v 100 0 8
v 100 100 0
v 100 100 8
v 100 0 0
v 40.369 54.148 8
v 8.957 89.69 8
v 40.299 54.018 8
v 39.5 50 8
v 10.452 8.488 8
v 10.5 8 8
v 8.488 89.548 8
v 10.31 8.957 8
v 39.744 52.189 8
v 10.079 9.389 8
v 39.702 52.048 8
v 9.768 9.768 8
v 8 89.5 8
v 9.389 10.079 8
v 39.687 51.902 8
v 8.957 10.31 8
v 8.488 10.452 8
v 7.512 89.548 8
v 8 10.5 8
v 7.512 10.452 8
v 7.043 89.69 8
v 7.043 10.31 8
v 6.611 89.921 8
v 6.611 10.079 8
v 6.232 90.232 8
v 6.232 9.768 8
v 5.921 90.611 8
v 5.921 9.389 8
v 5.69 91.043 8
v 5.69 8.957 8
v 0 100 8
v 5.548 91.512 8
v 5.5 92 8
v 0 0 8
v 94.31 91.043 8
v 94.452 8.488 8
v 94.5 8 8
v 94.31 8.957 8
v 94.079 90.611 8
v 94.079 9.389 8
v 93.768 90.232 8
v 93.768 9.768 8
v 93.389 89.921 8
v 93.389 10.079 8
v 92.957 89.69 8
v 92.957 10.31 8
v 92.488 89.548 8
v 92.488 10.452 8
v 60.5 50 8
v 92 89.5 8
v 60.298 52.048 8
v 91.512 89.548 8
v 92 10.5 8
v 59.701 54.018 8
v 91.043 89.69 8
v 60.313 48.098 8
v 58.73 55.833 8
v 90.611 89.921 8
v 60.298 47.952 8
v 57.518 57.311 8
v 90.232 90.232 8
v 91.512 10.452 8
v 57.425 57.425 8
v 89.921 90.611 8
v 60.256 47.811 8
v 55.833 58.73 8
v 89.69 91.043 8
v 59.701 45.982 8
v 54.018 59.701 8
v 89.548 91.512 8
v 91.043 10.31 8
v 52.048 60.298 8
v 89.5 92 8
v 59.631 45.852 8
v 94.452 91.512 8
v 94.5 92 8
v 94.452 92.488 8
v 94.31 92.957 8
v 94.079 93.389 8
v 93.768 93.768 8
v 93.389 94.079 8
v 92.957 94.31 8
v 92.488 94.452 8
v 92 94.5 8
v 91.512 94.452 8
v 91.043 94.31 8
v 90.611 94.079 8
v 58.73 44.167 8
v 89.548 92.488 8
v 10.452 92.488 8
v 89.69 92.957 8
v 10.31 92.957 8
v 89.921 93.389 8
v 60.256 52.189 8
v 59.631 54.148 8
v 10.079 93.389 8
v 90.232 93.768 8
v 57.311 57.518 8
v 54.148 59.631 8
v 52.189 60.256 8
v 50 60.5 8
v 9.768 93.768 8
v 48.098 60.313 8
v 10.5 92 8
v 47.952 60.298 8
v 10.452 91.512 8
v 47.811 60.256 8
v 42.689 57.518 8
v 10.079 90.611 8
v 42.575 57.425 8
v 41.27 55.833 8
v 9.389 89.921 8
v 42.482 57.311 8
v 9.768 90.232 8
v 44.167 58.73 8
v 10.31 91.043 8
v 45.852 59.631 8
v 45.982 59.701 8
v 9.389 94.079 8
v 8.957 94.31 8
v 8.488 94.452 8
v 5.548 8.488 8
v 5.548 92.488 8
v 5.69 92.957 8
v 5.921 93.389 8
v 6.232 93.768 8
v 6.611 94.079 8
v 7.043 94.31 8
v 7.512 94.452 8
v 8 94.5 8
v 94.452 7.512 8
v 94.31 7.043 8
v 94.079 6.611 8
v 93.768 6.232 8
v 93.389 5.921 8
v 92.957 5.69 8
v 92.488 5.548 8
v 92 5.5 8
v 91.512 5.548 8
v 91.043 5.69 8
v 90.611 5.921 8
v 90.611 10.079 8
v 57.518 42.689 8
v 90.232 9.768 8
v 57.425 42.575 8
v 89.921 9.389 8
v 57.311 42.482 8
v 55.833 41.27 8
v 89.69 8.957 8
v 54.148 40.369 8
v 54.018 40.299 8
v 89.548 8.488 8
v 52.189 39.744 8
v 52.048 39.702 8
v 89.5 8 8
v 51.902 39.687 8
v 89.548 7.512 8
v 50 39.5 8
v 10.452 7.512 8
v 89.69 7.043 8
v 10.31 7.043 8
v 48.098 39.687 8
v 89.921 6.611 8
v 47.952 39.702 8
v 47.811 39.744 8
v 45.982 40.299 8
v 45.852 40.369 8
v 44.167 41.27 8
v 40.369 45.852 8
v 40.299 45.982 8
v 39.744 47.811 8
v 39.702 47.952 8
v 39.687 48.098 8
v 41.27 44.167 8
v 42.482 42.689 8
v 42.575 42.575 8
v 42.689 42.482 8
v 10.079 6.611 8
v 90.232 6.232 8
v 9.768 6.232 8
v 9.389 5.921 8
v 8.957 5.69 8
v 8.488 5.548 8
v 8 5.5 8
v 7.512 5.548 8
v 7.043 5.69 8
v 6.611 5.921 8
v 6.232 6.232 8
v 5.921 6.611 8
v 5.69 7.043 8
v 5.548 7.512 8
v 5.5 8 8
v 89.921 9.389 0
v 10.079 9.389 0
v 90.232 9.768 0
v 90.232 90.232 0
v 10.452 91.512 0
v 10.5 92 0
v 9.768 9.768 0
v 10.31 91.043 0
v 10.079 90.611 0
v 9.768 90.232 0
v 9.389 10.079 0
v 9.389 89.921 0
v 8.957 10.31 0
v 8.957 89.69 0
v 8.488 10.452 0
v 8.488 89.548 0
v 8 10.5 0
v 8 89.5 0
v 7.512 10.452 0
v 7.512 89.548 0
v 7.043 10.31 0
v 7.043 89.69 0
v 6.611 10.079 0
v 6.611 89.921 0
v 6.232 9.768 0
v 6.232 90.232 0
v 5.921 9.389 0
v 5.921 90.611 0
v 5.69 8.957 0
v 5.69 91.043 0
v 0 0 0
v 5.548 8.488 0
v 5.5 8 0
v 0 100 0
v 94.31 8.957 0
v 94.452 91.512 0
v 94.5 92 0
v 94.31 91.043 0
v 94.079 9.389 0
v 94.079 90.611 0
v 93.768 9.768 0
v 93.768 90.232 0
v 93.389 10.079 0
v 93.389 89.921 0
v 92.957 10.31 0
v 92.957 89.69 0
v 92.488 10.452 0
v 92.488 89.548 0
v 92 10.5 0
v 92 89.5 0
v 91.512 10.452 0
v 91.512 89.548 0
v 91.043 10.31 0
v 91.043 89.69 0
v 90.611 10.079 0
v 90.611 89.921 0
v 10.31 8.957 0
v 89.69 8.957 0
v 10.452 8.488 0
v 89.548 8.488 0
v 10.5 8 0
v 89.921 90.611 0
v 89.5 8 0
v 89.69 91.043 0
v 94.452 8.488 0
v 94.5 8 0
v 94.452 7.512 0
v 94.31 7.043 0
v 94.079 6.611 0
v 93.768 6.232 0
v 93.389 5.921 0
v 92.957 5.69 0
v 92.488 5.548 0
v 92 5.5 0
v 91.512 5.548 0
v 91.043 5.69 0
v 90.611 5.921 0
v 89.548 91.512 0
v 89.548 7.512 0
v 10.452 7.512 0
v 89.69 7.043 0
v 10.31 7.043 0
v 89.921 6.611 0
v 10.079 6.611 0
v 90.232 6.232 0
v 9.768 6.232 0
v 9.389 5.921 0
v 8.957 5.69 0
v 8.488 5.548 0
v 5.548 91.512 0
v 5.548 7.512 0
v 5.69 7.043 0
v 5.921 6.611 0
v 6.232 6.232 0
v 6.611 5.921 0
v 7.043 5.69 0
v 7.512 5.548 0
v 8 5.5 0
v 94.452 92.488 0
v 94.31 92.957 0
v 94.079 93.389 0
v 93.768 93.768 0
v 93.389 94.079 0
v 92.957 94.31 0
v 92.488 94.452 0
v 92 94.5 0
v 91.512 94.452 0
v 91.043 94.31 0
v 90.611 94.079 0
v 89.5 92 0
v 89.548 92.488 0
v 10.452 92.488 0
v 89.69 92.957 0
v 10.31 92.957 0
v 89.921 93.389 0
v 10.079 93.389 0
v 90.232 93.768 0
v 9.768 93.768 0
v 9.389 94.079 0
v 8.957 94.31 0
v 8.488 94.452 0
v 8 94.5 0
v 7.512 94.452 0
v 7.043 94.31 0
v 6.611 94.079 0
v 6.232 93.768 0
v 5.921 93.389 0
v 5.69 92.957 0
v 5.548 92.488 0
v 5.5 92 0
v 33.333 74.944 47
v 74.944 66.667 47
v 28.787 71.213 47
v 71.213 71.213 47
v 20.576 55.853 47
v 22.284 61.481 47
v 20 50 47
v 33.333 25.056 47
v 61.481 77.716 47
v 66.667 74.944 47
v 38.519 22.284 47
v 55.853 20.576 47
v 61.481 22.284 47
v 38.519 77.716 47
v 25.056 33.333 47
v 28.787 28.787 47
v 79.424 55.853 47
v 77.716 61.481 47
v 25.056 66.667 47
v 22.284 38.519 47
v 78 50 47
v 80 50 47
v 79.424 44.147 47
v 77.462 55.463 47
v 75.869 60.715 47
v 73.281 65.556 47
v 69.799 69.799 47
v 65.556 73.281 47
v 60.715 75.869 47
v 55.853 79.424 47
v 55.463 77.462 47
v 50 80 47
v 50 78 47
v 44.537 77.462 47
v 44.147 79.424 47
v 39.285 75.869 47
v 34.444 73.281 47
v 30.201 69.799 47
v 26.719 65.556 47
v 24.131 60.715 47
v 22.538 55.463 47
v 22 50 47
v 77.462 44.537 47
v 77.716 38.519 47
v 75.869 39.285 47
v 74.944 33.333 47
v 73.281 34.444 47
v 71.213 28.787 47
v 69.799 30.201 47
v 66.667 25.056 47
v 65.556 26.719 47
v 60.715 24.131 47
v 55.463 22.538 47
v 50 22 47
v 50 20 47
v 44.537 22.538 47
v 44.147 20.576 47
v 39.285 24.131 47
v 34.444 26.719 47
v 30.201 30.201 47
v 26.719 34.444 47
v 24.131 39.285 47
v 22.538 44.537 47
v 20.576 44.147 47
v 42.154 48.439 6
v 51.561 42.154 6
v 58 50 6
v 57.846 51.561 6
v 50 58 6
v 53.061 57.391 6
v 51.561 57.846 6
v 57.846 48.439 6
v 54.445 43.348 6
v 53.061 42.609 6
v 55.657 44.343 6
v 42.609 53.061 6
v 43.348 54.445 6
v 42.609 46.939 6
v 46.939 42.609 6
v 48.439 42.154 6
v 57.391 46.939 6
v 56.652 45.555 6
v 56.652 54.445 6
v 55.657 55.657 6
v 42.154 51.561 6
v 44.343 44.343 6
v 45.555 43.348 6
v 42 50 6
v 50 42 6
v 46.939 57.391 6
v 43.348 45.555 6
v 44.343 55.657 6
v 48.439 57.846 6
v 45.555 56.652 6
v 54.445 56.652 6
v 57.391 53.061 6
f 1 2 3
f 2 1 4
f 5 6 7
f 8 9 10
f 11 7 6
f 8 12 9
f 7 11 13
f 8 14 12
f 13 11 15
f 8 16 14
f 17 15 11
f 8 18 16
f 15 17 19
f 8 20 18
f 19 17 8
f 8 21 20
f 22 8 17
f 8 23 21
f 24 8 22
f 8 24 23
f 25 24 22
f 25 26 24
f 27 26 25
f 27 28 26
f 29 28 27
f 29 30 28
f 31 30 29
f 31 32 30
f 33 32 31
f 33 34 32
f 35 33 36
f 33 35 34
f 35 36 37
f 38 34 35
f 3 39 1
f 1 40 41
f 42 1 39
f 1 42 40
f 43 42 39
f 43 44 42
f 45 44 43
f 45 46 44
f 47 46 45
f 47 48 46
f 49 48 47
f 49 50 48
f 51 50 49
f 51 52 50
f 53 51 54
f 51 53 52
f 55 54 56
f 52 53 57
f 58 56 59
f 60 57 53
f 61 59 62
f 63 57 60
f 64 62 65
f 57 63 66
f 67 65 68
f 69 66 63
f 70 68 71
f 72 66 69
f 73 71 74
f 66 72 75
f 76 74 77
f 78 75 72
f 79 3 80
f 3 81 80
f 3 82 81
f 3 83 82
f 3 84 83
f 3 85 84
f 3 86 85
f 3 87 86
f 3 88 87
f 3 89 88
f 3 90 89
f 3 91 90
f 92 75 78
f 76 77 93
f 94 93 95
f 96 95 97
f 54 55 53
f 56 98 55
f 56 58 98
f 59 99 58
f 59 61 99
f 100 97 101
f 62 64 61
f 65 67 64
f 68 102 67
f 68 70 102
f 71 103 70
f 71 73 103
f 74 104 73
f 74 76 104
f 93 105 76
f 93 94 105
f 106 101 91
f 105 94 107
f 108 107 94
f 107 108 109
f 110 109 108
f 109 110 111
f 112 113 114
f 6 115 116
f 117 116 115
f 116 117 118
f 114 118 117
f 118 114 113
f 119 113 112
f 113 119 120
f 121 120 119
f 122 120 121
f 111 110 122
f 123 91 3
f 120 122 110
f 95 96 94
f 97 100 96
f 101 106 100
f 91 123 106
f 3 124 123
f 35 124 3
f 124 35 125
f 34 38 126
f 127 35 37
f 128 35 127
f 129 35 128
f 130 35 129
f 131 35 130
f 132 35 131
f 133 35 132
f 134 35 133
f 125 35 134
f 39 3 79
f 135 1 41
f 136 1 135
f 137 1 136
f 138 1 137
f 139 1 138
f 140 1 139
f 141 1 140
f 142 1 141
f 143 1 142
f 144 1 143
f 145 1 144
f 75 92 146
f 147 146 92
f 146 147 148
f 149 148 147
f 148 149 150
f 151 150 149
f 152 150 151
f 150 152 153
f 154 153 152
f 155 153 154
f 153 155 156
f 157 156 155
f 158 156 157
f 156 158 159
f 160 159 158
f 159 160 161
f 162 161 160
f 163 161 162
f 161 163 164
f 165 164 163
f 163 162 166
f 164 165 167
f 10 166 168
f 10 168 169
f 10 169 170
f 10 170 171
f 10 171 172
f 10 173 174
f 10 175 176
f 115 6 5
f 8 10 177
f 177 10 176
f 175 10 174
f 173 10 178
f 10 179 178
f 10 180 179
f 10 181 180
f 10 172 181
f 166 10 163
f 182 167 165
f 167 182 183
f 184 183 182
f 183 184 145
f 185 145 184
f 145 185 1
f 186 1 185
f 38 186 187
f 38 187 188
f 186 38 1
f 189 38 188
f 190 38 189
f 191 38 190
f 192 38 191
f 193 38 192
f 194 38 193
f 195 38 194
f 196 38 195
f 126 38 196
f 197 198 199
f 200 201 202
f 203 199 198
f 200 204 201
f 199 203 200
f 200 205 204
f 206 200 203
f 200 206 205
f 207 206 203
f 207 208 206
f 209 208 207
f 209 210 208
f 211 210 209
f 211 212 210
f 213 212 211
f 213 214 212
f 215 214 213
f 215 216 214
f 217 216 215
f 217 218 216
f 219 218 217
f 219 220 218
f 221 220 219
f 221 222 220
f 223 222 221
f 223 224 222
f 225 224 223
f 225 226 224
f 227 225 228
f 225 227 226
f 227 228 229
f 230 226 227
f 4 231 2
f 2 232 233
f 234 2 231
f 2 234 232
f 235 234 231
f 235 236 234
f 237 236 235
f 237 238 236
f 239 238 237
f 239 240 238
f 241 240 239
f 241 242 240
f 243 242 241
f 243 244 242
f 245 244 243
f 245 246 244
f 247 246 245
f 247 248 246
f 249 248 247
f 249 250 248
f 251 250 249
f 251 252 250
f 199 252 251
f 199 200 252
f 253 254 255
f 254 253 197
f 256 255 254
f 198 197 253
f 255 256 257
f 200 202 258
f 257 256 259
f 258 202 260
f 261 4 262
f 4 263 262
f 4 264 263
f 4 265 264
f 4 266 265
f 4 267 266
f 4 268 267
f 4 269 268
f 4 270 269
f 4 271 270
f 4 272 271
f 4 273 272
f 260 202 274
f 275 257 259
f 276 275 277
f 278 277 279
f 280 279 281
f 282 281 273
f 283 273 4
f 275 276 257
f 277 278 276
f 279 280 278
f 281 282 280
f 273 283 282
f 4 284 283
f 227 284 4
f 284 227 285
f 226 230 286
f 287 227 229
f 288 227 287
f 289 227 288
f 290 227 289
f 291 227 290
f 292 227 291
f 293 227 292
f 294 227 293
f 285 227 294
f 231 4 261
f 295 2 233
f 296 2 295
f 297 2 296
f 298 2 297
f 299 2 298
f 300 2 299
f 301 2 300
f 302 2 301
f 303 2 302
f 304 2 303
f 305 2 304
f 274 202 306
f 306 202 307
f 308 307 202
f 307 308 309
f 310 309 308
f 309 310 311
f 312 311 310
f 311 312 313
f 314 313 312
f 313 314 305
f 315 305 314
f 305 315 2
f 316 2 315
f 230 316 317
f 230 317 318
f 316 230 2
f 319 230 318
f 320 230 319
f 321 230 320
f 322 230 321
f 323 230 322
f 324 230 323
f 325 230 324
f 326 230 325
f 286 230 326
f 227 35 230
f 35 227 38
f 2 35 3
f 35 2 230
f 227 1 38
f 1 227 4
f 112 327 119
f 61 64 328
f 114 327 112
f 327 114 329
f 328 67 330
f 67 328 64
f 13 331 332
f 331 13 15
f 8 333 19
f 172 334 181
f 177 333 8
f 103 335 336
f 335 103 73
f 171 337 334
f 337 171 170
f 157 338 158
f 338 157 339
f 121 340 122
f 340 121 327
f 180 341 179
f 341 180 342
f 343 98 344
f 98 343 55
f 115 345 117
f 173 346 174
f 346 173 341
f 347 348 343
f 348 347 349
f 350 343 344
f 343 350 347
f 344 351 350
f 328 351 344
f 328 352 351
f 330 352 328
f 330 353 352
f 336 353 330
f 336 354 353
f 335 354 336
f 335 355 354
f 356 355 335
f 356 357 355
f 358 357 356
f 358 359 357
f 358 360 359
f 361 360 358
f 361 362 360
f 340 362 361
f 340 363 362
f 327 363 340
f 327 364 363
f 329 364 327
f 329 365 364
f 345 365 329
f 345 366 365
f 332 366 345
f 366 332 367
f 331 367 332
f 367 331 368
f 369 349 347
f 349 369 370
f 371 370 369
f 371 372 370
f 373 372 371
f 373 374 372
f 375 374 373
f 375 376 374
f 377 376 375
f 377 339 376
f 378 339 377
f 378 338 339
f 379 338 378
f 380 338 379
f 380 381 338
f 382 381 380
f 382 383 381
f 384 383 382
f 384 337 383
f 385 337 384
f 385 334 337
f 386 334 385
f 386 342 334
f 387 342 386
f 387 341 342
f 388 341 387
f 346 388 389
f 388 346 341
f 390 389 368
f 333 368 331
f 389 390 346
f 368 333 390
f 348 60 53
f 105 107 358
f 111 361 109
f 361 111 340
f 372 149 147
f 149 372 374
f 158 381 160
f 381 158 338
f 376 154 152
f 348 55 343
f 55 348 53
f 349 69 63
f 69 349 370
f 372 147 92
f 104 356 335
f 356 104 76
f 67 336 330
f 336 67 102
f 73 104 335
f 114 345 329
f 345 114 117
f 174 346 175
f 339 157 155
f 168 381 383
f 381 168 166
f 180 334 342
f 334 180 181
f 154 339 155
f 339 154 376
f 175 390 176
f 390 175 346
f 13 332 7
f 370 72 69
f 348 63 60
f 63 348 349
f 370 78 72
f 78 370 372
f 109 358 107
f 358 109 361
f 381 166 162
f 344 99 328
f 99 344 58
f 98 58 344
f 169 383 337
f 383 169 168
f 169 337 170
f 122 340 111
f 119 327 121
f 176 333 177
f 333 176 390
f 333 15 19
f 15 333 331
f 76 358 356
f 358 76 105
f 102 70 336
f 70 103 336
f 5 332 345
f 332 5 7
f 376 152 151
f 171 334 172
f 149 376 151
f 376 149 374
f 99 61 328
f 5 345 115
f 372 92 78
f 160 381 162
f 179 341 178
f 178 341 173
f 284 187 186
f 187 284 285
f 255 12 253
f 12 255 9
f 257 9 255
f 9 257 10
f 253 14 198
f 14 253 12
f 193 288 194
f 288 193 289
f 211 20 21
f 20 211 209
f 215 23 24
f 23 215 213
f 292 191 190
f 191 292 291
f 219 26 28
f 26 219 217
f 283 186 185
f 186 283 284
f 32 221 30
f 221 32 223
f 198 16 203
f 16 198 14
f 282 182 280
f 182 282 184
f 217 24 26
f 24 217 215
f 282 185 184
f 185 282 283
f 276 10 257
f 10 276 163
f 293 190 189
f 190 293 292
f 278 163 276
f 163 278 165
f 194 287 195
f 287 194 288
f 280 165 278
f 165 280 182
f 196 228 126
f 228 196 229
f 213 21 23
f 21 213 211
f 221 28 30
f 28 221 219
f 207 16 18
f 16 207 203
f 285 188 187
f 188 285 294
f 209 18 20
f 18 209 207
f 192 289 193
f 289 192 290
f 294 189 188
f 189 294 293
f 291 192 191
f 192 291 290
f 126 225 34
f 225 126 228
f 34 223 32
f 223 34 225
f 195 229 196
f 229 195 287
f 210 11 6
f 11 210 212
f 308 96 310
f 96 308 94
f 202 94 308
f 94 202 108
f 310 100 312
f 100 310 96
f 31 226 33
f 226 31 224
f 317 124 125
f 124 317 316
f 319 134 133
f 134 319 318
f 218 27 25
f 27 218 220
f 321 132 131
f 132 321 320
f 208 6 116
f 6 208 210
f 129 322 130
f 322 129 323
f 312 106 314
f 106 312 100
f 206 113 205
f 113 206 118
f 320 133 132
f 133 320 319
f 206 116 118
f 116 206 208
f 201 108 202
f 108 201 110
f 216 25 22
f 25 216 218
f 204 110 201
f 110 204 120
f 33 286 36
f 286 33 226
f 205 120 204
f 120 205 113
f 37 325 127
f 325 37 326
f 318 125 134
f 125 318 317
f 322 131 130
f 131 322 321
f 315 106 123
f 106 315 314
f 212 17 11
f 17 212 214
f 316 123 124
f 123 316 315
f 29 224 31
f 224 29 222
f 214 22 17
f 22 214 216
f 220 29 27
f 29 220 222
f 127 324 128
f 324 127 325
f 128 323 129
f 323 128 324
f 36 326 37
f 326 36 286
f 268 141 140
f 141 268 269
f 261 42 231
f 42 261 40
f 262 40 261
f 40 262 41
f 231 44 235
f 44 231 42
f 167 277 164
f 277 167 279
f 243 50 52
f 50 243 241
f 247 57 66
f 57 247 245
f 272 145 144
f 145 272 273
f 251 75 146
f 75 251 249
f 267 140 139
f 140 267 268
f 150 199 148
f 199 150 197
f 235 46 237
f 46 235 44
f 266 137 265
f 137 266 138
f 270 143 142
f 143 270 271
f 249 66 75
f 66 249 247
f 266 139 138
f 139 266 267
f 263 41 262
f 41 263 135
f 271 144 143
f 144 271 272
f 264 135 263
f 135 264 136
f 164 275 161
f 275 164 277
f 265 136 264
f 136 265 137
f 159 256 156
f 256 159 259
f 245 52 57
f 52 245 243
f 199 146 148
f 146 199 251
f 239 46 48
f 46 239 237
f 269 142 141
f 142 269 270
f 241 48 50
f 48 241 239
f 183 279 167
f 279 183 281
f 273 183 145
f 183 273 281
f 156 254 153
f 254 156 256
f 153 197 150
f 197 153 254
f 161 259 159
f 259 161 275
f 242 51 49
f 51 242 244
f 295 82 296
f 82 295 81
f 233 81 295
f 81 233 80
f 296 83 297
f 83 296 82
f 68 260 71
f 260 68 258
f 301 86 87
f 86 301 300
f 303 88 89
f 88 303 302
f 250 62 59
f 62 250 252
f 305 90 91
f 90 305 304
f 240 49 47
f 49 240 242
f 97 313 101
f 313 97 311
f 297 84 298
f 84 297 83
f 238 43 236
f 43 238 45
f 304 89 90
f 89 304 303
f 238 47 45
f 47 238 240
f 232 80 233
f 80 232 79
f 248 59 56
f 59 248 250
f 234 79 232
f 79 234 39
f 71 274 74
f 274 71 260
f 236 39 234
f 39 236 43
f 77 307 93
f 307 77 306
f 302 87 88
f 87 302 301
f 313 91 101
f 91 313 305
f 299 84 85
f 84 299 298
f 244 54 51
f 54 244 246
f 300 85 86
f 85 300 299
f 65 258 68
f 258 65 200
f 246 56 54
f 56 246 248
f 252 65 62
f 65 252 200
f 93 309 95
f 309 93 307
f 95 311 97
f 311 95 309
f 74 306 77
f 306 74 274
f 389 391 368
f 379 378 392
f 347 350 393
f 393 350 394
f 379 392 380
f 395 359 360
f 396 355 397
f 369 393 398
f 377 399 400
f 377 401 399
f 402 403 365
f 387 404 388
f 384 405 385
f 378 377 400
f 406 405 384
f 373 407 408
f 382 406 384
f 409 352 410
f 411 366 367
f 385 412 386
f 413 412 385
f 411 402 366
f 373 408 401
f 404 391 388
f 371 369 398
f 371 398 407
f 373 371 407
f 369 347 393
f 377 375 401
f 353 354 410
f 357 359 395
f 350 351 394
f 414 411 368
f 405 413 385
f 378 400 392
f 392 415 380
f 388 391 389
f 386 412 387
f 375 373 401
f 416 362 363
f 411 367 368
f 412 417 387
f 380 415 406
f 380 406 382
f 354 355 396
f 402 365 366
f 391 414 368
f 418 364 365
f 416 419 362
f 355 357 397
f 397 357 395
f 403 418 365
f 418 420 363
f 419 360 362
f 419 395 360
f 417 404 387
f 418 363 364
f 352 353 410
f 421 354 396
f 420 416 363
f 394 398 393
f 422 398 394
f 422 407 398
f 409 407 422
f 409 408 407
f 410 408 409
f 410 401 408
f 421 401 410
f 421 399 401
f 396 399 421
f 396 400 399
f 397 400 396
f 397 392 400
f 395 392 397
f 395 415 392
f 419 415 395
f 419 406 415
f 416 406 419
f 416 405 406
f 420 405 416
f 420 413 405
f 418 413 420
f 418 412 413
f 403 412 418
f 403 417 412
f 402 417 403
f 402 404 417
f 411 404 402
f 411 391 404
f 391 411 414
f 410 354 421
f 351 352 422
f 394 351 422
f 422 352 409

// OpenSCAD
$fn = 32;

// ----------------------------------------------------------------------
// Hopper: flanged with square flange
// ----------------------------------------------------------------------

// --- parameters (mm) ---
fl = 100;                 // flange side, X and Y
fl_t = 8;                 // flange thickness
cone_h = 40;              // cone height above the flange
top_d = 60;               // cone mouth diameter
bot_d = 20;               // cone spout diameter
wall = 2;                 // cone wall thickness
hole_r = 2.5;             // flange hole radius
hole_in = 8;              // hole inset from the corners

bore_d = bot_d - 2 * wall;  // spout bore diameter
total_h = fl_t + cone_h - 1;  // overall height

difference() {
  union() {
    cube([fl, fl, fl_t]);
    translate([fl / 2, fl / 2, fl_t - 1])
      cylinder(h = cone_h, d1 = bot_d, d2 = top_d);
  }
  translate([fl / 2, fl / 2, fl_t - 2])
    cylinder(h = cone_h + 1, d1 = bore_d, d2 = top_d - 2 * wall);
  for (sx = [0, 1], sy = [0, 1])
    translate([sx ? fl - hole_in : hole_in,
               sy ? fl - hole_in : hole_in, -1])
      cylinder(r = hole_r, h = fl_t + 2);
}
